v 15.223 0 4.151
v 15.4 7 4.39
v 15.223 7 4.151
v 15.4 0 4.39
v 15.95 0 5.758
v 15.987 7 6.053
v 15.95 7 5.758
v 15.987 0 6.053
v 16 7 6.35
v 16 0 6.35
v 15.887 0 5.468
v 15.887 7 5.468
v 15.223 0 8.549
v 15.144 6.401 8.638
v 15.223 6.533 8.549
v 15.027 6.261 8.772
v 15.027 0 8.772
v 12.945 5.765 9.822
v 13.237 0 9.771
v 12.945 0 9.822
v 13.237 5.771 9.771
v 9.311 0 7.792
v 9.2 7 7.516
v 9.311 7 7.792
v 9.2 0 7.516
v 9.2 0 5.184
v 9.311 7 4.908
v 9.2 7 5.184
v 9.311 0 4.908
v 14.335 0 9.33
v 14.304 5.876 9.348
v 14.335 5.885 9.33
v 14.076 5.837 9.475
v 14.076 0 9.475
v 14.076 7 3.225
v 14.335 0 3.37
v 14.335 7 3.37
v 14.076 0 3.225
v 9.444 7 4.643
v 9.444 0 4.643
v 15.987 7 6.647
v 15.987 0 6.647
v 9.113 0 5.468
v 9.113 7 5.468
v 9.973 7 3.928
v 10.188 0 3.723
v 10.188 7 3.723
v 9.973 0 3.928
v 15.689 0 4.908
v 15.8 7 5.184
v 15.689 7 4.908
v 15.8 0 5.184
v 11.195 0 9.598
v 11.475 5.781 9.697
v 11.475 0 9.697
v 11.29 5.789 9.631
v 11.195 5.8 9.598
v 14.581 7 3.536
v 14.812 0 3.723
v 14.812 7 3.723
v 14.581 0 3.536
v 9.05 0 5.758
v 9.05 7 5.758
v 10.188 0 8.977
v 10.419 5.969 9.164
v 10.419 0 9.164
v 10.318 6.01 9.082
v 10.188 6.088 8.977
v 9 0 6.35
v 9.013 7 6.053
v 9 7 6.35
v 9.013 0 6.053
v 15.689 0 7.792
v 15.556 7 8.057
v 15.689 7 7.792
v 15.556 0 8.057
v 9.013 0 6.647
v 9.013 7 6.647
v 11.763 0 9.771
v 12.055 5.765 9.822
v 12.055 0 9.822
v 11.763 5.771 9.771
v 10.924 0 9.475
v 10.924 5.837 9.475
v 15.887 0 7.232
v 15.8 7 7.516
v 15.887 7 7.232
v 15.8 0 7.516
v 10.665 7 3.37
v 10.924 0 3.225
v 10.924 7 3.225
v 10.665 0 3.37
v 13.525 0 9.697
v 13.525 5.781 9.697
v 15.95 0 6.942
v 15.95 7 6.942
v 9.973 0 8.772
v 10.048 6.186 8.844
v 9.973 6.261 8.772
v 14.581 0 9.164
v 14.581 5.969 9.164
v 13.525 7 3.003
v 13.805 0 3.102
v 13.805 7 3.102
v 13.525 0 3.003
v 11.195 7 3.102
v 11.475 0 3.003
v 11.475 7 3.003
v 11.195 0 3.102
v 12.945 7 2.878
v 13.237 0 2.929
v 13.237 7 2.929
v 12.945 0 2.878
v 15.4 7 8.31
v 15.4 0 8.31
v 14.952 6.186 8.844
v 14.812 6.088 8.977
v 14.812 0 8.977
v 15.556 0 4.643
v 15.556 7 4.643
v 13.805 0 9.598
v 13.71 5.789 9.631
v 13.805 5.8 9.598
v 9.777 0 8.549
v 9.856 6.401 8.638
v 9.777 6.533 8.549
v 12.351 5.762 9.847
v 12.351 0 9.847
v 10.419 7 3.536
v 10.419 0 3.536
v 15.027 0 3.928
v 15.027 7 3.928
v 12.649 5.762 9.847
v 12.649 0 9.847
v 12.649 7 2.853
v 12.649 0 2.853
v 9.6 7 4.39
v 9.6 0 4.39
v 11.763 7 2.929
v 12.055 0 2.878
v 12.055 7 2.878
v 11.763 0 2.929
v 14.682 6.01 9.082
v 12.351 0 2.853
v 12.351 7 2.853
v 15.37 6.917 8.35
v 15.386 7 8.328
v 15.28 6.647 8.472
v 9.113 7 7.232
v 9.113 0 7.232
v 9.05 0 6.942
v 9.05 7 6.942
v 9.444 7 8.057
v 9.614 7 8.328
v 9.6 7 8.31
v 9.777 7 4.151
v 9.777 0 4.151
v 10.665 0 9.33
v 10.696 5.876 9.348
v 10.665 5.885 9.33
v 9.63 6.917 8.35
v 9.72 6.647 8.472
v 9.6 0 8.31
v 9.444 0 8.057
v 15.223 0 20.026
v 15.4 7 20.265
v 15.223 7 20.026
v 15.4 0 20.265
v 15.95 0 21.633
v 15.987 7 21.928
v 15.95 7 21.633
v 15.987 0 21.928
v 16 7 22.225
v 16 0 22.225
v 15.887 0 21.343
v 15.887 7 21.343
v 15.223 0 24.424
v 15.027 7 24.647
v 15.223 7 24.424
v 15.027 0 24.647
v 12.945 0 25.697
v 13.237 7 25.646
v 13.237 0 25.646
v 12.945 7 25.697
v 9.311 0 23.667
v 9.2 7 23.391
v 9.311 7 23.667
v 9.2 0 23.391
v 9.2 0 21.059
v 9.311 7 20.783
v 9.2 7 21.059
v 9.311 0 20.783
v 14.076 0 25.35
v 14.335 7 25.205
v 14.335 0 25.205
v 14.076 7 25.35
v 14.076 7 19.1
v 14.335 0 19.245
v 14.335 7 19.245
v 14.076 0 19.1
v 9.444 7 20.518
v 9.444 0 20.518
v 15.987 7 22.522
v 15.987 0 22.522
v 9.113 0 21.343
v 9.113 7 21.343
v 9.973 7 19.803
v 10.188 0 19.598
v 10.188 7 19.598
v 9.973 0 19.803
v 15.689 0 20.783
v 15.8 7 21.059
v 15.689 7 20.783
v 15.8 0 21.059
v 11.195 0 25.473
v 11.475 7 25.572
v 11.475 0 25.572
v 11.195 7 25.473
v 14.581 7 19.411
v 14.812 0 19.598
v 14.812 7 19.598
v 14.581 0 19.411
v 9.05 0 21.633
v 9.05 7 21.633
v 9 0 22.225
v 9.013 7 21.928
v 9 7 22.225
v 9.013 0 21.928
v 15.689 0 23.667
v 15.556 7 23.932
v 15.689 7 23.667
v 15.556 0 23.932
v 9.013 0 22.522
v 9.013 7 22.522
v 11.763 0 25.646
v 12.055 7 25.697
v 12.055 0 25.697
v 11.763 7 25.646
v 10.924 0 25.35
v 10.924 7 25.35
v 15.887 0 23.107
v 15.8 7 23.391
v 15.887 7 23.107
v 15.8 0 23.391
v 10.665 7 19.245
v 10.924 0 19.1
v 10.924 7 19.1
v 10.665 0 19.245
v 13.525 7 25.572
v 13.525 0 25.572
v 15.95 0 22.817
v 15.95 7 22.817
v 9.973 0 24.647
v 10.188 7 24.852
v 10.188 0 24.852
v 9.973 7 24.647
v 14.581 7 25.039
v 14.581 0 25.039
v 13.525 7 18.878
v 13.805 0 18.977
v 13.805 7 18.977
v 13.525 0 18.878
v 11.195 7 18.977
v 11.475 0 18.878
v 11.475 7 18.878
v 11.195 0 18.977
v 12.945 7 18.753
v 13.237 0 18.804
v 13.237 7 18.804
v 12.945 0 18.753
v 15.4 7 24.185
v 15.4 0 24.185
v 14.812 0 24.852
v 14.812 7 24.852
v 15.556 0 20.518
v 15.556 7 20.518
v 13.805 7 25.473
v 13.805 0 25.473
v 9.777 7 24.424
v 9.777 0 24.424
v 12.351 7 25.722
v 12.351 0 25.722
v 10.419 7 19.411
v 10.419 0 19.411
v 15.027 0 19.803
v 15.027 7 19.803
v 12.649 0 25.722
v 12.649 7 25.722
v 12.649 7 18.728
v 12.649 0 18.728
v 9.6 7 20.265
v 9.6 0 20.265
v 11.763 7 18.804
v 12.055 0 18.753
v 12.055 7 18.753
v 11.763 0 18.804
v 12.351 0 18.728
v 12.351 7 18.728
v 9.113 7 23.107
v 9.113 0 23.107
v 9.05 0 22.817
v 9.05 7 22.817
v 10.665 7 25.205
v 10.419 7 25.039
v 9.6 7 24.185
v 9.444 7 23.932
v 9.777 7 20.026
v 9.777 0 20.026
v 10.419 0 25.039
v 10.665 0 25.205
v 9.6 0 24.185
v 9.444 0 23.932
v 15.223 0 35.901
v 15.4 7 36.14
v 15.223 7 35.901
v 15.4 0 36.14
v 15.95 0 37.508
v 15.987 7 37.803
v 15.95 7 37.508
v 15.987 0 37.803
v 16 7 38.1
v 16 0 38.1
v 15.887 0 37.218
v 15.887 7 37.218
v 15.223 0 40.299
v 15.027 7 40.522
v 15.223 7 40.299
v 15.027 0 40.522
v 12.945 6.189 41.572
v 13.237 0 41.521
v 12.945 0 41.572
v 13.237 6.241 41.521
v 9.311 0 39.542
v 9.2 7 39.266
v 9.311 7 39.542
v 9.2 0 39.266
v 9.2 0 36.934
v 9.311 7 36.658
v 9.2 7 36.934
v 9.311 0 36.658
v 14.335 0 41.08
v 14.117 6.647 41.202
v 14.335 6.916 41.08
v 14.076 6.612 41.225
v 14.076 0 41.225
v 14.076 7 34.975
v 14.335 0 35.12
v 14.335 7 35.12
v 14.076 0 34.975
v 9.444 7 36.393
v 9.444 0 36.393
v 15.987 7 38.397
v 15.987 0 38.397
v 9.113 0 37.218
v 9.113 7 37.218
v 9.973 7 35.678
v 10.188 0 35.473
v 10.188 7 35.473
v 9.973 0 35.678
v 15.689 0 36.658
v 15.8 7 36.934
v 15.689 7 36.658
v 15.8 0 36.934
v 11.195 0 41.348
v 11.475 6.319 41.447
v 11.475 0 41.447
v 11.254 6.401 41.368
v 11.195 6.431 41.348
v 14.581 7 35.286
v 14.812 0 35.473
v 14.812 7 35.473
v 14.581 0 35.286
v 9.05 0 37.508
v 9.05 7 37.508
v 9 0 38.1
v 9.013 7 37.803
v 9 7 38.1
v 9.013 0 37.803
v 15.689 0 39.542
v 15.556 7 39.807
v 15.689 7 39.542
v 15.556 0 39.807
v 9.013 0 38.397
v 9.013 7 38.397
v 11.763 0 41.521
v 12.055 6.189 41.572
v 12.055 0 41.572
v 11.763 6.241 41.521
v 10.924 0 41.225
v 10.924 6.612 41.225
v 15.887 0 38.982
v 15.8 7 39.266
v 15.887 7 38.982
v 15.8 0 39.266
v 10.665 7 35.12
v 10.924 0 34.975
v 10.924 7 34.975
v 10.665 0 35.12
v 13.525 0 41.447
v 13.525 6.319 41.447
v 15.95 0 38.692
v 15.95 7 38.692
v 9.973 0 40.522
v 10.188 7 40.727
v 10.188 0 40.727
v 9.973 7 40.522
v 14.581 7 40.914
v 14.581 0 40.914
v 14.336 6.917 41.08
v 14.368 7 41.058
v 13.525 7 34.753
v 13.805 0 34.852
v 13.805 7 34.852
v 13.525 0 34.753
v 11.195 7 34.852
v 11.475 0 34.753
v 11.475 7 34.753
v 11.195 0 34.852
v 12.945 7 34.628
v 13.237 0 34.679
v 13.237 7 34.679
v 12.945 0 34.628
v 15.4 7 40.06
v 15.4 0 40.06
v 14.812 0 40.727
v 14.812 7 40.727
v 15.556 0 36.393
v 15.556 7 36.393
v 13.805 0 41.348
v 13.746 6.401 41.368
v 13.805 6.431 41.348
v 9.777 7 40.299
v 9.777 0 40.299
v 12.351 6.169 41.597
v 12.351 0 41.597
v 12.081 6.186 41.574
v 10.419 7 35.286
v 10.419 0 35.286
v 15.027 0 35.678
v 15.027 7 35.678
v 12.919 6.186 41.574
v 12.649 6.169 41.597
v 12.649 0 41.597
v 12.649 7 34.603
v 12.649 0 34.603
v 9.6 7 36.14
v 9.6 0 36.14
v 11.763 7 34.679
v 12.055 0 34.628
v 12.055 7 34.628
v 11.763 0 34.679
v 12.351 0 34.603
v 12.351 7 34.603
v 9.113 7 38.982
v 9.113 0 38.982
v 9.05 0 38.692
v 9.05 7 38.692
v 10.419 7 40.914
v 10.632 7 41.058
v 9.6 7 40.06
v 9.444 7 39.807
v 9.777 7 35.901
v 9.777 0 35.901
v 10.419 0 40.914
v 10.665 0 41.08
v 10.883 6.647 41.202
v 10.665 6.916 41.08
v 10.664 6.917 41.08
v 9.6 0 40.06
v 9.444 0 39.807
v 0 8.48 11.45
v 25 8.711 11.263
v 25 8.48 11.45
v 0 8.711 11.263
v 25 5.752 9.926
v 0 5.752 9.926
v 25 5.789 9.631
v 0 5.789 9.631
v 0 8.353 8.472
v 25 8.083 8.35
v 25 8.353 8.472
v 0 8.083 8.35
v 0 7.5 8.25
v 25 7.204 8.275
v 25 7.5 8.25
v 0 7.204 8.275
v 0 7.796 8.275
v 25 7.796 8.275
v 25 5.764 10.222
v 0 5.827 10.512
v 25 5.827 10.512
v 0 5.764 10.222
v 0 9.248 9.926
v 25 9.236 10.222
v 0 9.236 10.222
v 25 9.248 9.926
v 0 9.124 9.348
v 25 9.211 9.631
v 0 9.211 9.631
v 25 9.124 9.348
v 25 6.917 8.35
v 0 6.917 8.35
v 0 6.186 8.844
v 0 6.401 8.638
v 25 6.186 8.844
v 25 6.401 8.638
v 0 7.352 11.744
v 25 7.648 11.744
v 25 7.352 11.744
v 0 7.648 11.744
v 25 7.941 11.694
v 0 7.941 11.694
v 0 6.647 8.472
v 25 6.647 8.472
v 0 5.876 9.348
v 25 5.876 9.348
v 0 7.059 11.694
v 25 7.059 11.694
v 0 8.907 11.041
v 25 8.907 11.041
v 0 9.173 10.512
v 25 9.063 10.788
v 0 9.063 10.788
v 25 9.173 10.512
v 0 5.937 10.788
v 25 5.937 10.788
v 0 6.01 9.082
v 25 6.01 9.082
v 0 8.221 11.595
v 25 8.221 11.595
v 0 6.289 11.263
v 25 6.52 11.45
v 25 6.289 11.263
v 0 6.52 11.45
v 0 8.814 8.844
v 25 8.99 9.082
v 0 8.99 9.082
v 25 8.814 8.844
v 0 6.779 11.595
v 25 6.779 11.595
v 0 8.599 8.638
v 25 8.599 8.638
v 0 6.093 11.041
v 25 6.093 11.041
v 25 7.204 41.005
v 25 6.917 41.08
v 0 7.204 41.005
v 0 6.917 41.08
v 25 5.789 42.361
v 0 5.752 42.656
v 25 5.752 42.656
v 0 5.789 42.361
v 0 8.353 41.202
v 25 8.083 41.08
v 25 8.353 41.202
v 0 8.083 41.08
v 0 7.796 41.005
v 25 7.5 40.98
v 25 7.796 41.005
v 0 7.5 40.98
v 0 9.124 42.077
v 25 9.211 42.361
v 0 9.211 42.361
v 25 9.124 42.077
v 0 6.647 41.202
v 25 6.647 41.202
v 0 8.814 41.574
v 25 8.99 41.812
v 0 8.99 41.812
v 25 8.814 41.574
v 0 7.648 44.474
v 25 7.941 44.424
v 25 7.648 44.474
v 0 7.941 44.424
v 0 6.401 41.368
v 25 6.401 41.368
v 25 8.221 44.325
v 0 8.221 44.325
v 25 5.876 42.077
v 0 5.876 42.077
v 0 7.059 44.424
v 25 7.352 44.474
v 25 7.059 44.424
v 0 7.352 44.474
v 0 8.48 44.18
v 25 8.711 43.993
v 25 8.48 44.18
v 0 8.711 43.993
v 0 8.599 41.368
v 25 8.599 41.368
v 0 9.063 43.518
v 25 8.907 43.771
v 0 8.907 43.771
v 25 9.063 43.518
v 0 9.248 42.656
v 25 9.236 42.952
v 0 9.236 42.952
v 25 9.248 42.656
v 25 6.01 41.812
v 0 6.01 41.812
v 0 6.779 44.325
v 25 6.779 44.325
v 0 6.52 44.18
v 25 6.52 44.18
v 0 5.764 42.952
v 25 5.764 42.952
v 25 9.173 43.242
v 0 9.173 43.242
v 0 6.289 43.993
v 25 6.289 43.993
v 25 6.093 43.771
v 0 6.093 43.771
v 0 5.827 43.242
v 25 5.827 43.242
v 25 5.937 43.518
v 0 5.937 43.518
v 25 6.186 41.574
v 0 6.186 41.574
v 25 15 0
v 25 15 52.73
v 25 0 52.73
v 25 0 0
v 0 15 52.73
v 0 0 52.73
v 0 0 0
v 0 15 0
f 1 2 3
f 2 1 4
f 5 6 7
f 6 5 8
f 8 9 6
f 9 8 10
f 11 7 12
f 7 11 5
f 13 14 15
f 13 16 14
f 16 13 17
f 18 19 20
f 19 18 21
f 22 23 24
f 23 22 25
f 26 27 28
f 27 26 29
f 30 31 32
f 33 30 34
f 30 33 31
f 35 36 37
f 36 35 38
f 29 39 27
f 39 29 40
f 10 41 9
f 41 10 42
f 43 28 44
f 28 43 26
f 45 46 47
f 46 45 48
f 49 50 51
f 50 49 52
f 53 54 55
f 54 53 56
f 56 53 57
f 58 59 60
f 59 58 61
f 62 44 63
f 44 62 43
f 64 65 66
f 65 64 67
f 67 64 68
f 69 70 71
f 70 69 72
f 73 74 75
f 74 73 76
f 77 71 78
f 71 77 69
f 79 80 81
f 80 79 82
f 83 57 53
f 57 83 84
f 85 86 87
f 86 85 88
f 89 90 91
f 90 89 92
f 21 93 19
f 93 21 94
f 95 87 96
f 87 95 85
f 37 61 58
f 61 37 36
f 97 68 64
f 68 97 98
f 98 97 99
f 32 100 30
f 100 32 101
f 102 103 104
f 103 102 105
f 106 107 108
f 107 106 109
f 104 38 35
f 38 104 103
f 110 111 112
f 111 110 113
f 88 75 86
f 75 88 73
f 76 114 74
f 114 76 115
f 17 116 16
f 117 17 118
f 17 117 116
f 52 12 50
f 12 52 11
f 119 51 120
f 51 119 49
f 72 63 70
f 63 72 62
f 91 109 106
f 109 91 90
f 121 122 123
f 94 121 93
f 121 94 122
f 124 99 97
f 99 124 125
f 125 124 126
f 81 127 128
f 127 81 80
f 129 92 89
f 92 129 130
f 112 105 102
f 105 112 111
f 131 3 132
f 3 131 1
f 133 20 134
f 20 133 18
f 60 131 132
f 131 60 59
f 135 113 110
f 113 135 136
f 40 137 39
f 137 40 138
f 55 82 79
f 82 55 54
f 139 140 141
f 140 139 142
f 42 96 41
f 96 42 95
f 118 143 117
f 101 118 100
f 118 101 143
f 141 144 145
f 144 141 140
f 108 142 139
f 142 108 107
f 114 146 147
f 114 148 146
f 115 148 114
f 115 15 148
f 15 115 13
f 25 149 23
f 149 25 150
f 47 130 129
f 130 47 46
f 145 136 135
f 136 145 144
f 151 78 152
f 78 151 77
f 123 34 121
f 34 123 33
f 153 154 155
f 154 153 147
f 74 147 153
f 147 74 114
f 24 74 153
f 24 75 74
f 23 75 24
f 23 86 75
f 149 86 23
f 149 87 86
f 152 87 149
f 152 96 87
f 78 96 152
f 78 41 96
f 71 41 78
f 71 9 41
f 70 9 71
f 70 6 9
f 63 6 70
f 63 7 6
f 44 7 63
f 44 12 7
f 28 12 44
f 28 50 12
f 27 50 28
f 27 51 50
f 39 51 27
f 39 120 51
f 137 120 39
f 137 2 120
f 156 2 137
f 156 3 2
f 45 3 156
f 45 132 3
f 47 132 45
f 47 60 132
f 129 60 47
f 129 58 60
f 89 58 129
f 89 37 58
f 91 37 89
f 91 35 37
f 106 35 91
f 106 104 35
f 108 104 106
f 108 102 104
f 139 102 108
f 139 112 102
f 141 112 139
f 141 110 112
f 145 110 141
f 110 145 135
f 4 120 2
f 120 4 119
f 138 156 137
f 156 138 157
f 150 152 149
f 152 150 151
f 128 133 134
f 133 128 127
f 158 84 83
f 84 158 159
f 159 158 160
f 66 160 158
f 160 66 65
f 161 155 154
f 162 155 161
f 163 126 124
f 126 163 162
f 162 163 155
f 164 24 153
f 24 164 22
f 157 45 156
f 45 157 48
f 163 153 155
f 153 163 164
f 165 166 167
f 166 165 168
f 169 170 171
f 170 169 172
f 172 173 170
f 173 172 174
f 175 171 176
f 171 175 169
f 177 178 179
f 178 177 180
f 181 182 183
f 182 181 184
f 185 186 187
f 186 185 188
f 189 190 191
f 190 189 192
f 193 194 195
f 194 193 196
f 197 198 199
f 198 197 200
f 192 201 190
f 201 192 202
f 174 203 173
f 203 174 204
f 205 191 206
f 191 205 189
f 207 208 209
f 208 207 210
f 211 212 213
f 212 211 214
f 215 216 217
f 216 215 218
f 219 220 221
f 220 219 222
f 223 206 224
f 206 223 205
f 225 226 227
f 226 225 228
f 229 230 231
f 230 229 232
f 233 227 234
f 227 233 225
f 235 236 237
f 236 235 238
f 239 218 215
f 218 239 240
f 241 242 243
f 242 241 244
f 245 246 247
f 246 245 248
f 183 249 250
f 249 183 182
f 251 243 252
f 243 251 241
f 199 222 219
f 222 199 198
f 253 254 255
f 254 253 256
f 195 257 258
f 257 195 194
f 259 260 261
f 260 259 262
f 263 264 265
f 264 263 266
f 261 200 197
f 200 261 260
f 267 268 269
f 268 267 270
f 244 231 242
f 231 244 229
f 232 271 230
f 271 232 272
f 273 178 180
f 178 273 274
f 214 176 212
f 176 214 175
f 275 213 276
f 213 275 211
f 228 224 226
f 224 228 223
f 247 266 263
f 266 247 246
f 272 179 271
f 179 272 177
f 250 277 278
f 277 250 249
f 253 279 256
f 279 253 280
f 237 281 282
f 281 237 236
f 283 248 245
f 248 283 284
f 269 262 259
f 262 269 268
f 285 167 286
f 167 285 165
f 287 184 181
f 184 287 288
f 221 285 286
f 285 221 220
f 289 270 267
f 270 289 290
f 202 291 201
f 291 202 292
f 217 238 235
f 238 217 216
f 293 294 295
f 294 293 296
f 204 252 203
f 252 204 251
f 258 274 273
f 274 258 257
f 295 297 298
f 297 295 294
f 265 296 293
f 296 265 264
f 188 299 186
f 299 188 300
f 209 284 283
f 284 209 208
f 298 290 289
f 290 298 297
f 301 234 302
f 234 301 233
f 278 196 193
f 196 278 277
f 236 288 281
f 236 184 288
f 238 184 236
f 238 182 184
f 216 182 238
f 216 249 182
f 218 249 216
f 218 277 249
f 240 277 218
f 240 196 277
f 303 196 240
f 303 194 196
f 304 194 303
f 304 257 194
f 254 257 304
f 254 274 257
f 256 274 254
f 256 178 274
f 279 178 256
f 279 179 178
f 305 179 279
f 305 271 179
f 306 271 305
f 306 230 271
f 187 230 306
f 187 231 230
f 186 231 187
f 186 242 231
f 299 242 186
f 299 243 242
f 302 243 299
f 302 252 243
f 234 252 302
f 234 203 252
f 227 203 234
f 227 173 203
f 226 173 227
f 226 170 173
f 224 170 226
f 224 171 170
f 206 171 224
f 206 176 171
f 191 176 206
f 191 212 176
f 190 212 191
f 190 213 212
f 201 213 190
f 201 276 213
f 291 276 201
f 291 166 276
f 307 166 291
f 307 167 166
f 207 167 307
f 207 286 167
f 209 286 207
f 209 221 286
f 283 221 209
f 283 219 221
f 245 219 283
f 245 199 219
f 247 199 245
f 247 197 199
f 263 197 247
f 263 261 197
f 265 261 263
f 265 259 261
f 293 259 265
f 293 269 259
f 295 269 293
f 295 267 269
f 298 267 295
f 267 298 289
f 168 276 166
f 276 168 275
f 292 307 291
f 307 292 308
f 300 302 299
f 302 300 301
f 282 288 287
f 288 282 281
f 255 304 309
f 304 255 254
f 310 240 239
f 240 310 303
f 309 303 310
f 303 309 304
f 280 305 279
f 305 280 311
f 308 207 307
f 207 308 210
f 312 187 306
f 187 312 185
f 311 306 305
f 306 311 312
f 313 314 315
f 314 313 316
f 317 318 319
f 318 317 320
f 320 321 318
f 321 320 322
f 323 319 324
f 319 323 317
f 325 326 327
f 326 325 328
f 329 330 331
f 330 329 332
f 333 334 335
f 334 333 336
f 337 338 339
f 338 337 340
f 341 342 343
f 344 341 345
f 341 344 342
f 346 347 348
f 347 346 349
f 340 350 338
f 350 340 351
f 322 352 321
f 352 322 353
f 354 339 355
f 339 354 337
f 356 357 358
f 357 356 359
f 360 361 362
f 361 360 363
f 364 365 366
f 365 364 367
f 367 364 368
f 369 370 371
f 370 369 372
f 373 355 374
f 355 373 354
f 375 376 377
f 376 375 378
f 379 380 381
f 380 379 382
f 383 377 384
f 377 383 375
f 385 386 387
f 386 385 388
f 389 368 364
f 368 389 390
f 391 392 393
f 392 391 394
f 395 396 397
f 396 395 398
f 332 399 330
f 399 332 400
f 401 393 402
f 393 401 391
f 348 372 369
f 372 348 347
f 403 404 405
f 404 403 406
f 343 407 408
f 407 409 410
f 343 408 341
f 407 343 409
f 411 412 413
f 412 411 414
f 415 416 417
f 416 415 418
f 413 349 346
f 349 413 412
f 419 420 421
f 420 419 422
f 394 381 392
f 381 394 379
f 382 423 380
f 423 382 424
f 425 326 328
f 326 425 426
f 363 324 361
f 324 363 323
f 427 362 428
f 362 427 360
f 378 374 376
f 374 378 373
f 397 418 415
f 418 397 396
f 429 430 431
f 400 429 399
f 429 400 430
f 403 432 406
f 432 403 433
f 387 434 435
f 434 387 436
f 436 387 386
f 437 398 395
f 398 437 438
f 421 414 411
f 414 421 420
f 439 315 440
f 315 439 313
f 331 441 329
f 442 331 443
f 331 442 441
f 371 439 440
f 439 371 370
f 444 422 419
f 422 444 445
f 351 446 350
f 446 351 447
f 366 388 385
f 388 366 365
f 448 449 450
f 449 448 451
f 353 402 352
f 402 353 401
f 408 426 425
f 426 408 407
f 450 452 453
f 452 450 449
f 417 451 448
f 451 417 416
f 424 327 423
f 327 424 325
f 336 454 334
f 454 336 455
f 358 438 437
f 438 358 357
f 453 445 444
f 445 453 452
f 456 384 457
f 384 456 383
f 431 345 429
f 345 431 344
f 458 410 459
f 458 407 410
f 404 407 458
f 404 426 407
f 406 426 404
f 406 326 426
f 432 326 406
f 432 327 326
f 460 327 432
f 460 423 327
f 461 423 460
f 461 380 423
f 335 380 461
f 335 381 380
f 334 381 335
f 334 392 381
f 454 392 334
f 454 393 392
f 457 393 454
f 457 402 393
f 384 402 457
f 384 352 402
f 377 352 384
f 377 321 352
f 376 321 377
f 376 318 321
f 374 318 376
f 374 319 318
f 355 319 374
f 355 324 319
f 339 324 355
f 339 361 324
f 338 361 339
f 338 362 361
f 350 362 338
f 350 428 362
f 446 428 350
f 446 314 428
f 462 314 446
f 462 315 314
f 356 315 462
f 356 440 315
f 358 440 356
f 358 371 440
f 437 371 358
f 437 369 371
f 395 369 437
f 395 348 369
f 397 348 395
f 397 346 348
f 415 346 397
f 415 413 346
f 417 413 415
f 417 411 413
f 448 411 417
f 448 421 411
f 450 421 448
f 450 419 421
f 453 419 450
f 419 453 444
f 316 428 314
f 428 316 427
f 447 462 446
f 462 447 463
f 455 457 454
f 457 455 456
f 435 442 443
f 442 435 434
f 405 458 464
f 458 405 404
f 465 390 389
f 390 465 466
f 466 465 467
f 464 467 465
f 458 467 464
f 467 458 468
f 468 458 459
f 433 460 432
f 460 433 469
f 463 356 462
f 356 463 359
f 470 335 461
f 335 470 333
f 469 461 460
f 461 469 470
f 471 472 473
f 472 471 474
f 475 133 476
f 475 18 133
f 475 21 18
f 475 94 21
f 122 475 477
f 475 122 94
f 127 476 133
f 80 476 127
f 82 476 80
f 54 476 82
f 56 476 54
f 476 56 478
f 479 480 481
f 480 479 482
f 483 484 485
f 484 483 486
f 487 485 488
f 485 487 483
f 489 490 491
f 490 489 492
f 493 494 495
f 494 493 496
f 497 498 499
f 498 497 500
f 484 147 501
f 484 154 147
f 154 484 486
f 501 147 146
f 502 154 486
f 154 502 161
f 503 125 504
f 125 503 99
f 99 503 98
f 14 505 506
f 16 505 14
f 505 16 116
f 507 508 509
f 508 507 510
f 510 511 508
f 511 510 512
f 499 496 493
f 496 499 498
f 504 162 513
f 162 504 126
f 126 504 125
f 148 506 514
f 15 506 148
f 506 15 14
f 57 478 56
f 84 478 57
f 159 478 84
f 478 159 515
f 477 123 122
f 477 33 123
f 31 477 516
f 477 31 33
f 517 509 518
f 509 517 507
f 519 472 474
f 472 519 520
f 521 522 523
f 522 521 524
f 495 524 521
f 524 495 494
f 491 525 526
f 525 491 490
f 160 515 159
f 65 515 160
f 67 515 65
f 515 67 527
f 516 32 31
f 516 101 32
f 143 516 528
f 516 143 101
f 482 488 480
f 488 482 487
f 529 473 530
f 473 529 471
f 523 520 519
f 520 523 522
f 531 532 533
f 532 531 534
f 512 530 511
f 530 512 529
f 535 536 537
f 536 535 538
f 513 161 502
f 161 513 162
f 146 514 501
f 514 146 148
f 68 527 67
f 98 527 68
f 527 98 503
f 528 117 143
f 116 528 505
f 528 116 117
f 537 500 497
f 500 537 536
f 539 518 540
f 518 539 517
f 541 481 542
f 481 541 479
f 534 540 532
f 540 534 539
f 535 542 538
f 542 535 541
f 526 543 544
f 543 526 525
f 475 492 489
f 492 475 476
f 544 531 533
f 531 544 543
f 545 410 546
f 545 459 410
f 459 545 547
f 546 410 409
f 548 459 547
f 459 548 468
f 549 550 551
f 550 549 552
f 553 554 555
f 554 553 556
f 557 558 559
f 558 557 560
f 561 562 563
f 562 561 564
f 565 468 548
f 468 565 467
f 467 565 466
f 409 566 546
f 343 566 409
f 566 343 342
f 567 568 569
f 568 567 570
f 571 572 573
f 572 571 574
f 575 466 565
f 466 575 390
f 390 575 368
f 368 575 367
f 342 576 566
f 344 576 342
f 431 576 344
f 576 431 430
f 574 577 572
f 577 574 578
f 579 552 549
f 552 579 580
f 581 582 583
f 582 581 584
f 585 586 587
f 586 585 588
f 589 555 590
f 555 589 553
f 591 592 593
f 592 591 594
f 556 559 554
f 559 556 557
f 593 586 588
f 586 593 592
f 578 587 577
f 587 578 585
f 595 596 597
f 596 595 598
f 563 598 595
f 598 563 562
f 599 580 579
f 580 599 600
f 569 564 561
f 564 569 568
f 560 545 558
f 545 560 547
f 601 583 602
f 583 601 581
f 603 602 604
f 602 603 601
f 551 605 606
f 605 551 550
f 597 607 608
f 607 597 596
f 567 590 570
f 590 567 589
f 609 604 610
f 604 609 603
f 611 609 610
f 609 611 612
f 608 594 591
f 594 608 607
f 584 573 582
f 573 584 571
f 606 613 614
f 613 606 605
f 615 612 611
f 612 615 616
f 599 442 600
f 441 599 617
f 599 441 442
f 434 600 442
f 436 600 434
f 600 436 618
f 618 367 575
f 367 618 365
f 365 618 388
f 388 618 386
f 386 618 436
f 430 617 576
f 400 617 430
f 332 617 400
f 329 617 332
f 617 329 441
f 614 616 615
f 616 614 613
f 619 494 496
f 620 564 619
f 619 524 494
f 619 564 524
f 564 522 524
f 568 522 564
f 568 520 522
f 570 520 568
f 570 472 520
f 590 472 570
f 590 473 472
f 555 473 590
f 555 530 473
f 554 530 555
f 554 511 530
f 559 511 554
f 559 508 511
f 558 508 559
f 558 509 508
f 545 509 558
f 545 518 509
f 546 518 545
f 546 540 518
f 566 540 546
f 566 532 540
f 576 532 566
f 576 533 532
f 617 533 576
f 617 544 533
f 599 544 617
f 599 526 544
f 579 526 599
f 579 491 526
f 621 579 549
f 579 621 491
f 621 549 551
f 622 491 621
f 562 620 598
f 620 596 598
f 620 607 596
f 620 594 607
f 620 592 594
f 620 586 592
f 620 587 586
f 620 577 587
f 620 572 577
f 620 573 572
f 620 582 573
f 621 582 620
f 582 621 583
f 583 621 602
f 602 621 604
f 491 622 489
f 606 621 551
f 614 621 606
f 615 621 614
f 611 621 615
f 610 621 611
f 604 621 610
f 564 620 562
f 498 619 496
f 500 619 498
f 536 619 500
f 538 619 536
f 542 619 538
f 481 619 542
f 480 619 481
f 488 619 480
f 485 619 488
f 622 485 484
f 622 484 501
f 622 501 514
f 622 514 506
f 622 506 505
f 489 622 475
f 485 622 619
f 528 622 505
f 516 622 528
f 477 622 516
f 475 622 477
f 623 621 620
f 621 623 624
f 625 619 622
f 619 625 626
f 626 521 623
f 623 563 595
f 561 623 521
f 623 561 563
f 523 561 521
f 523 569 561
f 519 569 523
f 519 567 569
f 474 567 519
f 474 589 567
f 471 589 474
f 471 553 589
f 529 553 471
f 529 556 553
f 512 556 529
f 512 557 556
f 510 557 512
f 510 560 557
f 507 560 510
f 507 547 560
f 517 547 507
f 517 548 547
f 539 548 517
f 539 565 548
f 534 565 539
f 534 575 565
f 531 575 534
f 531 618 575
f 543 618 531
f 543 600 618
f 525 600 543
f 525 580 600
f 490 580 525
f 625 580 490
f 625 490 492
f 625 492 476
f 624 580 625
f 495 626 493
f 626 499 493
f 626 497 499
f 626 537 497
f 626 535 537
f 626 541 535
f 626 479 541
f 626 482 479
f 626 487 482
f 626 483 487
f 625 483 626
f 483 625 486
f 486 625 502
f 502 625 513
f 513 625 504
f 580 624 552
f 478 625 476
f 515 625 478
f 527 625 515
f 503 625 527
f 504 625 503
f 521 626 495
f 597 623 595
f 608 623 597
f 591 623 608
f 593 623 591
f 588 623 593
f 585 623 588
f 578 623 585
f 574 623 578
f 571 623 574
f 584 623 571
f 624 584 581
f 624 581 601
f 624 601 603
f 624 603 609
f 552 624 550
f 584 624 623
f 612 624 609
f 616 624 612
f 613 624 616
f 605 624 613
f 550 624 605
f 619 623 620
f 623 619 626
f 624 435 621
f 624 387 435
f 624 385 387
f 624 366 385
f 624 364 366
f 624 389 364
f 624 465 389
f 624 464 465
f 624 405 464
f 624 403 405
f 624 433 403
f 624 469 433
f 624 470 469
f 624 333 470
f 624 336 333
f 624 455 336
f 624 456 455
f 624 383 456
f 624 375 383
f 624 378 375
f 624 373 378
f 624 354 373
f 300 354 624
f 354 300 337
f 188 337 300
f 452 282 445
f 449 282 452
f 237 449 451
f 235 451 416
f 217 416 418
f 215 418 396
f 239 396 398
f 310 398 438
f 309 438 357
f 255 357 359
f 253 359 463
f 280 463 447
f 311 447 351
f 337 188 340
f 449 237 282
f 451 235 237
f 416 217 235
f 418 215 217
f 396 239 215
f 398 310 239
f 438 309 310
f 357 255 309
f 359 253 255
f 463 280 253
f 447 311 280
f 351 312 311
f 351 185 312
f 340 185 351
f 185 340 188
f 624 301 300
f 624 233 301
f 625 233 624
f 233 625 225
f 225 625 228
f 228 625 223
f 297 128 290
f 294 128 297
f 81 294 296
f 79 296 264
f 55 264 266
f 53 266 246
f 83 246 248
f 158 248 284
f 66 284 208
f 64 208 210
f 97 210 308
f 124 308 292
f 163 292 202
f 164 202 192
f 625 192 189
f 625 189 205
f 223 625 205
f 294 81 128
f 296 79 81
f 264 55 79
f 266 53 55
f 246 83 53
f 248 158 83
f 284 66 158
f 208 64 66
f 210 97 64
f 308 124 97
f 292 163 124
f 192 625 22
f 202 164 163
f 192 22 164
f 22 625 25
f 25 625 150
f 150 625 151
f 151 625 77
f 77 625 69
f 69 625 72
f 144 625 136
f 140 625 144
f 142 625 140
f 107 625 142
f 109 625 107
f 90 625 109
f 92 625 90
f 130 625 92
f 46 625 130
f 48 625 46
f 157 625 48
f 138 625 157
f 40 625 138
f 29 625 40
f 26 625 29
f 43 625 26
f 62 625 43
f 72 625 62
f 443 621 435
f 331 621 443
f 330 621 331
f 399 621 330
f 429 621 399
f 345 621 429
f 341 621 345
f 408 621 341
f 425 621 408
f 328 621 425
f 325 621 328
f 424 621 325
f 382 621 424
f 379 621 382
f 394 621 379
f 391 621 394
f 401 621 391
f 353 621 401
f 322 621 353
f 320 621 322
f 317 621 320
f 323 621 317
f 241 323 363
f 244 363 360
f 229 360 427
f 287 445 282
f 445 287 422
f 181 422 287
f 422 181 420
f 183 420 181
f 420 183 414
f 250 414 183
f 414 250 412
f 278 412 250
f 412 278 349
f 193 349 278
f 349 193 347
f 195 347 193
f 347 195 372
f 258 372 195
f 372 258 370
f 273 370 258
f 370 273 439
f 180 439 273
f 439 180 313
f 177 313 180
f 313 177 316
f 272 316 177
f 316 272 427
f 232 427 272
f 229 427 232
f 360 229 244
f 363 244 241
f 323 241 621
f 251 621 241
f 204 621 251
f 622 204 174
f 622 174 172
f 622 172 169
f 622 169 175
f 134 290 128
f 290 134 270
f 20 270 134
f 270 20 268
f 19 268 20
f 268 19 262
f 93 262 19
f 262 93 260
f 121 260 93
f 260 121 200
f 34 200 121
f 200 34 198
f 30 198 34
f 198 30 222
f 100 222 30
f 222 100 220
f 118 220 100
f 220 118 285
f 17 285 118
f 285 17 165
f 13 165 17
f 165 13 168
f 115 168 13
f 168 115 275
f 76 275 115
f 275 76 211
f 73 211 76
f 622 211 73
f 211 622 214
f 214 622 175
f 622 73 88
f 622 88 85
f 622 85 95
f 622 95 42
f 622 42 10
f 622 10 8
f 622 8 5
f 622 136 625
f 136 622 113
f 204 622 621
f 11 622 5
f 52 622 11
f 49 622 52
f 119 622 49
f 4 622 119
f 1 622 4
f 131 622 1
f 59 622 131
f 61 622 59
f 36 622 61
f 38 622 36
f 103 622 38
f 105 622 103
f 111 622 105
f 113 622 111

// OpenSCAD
// =============================================================================
// CONSOLE10 — Rail
// Parametric OpenSCAD source, per Design Document v2.1 §3 / §5
//
// Vertical 3D-printed plastic rail. Rectangular bar cross-section.
// Front face: 10-32 heat-set insert pockets at EIA-310 vertical hole spacing.
// Side face (cheek-facing): M3 clearance holes; screws pass through into
// heat-set inserts in the cheek interior face.
//
// Default height = 52.73 mm = the front rail (1U usable, derived from the
// trapezoidal cheek front edge). Back rail = call with height = 160.
// =============================================================================

/* [Rail dimensions] */
rail_height = 52.73;   // [40:0.01:200] rail height (mm); 52.73 = front, 160 = back
rail_w      = 25;      // [15:1:40] width of the rail (X axis when placed)
rail_d      = 15;      // [10:1:25] depth toward module interior (Y axis when placed)

/* [Hole specs] */
insert_10_32_d     = 7;     // 10-32 brass heat-set insert hole diameter
insert_10_32_depth = 7;     // depth of 10-32 insert pocket
m3_clear_d         = 3.5;   // M3 clearance hole (screw passes through; no thread)

/* [Render quality] */
$fa = 2;
$fs = 0.3;

// =============================================================================
//                                  DERIVED
// =============================================================================
U = 44.45;                     // 1U vertical
eia_offsets = [6.35, 22.225, 38.10];  // EIA-310 hole positions within each U

// How many full U fit in this rail height
u_count = floor(rail_height / U);

// Generate flat list of all 10-32 hole z-positions
function flatten(l) = [for(a=l) for(b=a) b];
hole_zs = flatten([for(u_idx = [0:u_count-1])
                       [for(o = eia_offsets) u_idx*U + o]]);

// M3 cheek-mount hole positions: at least 2 (top + bottom 10mm in); add a
// middle position for rails > 80mm tall
m3_zs = (rail_height < 80)
        ? [10, rail_height - 10]
        : [10, rail_height / 2, rail_height - 10];

// =============================================================================
//                              RAIL BODY
// =============================================================================
module rail() {
    difference() {
        // Solid rectangular bar
        cube([rail_w, rail_d, rail_height]);

        // 10-32 heat-set insert pockets on the FRONT face (y = 0).
        // Pocket runs from y = 0 INTO the rail (toward +y).
        for (z = hole_zs)
            translate([rail_w/2, -0.01, z])
                rotate([-90, 0, 0])
                    cylinder(d = insert_10_32_d, h = insert_10_32_depth + 0.01);

        // M3 clearance holes on the SIDE face (x = 0, cheek-facing).
        // Pass-through: hole runs all the way across the rail width.
        for (z = m3_zs)
            translate([-0.01, rail_d/2, z])
                rotate([0, 90, 0])
                    cylinder(d = m3_clear_d, h = rail_w + 0.02);
    }
}

rail();
